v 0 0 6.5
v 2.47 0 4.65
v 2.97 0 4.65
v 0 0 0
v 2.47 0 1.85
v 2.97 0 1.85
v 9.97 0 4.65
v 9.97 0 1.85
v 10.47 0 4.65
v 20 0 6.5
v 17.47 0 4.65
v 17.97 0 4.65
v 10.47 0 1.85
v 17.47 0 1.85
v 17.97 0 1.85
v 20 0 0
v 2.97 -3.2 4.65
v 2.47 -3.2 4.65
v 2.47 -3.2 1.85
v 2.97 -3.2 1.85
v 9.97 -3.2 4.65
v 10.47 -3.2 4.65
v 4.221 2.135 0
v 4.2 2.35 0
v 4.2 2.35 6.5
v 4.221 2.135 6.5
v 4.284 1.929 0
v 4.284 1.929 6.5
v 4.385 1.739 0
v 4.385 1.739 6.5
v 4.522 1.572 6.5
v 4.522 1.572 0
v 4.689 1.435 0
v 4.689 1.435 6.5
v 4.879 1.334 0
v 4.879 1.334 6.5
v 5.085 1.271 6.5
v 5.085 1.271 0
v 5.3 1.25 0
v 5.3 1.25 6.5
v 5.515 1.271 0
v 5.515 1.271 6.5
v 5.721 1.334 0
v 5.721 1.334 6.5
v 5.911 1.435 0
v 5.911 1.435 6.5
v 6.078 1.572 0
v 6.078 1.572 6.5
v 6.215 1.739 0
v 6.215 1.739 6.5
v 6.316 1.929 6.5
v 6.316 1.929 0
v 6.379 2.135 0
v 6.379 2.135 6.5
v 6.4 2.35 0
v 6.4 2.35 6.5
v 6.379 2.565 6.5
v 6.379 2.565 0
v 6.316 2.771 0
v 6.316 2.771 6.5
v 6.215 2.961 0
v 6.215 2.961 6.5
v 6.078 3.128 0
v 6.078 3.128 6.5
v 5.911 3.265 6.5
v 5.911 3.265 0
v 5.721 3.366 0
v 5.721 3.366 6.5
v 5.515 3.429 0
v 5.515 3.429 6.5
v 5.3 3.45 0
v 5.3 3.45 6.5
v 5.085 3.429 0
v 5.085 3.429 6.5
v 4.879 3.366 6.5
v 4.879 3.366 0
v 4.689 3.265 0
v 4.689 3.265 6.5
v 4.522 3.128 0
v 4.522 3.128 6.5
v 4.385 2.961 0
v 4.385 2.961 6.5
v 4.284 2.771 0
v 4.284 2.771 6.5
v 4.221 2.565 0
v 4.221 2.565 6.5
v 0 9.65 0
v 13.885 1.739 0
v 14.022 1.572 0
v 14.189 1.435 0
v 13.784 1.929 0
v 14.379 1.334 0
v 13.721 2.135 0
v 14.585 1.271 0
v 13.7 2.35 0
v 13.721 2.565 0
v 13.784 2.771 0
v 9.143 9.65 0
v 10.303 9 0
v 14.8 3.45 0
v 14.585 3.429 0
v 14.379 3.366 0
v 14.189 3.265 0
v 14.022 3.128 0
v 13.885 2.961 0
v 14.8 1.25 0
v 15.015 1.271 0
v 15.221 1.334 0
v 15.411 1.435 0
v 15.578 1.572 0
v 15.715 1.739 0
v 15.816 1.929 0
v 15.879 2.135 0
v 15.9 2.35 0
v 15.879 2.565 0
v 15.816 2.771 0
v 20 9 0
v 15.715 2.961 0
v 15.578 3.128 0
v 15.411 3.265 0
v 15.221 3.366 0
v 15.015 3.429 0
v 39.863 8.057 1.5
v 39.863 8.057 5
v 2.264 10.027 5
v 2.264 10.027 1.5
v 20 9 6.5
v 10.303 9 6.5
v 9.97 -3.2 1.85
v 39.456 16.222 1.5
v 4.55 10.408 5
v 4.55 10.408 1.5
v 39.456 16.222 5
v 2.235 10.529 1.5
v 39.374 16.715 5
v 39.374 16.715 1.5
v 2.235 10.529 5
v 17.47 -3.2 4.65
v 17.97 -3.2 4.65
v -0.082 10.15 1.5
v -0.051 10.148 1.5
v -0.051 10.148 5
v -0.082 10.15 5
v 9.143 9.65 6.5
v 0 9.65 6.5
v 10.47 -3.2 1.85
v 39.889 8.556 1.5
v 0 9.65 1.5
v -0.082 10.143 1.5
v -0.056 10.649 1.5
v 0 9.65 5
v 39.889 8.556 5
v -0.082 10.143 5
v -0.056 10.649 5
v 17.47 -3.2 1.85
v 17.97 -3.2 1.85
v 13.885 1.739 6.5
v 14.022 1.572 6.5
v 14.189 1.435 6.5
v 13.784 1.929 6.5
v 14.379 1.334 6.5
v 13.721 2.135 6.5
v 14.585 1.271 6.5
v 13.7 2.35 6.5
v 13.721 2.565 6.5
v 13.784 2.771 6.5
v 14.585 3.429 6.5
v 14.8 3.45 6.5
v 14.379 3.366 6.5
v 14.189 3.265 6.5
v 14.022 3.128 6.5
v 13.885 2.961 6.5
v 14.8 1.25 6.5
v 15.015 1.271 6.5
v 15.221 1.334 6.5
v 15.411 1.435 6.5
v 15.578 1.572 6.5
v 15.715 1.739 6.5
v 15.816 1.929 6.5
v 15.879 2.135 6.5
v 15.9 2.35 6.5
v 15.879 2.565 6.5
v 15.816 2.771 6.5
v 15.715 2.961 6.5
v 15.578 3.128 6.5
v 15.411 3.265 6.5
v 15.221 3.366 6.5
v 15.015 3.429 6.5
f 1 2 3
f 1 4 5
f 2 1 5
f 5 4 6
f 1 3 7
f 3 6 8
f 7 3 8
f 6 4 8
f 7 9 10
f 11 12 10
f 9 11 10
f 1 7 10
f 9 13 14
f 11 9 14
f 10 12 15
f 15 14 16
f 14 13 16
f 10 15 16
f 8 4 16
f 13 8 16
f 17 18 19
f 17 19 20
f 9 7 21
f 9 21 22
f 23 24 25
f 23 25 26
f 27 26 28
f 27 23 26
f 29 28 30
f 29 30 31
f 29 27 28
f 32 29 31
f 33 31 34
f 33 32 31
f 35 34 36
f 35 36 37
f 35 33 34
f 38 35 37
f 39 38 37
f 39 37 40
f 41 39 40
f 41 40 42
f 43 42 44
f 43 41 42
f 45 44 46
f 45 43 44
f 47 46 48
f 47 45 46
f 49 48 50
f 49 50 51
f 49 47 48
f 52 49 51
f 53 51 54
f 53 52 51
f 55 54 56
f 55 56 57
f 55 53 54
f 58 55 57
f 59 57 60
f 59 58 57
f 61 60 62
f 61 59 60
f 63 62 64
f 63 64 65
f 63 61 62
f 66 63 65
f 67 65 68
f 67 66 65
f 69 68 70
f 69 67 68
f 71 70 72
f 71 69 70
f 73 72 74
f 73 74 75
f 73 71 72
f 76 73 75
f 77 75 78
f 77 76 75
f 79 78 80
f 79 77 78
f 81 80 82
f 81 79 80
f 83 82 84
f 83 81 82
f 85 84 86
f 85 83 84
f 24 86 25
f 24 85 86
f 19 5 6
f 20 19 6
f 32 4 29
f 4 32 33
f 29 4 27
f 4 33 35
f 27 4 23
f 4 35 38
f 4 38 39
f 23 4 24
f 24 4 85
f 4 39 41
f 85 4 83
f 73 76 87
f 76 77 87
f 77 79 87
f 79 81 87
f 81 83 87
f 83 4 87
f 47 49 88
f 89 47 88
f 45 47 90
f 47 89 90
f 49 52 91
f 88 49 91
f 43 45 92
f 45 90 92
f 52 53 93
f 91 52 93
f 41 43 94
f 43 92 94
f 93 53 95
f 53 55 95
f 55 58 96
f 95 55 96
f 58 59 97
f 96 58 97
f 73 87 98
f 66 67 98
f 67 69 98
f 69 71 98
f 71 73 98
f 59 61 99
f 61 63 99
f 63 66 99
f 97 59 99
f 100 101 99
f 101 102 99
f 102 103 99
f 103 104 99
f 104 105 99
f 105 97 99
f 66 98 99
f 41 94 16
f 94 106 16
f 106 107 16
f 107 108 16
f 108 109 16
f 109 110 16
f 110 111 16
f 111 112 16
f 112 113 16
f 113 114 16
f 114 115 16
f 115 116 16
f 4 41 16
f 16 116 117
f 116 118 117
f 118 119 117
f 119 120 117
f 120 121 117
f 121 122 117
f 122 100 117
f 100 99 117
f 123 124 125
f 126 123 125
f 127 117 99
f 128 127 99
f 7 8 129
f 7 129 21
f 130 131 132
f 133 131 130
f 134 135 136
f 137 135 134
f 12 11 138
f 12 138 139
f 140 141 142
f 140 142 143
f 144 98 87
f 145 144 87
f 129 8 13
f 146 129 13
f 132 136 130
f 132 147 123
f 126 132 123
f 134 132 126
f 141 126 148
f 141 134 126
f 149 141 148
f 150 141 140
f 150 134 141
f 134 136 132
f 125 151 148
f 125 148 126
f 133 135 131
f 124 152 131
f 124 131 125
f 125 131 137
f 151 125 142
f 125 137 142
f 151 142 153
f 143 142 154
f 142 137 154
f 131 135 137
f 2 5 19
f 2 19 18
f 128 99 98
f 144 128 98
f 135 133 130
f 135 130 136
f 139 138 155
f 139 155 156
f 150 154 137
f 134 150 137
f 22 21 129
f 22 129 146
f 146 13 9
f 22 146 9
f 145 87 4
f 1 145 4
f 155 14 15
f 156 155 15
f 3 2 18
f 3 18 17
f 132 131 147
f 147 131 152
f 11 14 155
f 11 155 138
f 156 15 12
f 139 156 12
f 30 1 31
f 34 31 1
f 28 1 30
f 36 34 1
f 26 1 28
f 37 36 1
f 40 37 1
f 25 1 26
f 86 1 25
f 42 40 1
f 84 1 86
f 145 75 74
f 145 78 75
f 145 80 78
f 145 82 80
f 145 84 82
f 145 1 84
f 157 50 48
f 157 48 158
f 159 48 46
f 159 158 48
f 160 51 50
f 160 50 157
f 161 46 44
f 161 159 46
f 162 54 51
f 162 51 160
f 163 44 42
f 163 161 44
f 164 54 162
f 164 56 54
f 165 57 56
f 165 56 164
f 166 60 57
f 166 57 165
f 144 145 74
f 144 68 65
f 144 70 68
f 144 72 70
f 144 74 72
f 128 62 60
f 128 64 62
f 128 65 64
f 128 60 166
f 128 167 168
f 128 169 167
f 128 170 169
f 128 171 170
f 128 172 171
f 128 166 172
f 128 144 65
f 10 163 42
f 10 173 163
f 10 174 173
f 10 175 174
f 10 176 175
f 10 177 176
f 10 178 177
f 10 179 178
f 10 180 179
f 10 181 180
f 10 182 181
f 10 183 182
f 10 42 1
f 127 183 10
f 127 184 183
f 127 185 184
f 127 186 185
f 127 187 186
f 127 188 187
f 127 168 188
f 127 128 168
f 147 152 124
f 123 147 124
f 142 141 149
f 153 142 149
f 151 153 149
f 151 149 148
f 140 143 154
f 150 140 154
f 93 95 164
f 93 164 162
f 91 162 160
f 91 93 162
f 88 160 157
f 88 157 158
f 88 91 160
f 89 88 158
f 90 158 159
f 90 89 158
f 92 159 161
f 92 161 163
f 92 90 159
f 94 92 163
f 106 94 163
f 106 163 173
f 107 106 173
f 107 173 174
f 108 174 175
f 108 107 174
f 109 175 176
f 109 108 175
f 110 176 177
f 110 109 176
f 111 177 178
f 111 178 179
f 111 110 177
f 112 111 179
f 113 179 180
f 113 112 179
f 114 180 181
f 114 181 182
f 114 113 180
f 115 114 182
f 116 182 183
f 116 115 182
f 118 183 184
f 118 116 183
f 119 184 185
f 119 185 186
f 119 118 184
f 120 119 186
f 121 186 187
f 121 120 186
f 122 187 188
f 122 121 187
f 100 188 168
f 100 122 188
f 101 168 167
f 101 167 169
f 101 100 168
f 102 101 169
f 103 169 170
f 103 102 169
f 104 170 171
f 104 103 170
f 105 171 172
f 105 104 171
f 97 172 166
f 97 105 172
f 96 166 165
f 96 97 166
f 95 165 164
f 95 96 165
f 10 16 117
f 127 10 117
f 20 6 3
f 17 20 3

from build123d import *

# Parameters (mm, degrees)
ESQUISSE1_R      = 1.1
EXTRUSION1_DEPTH = 6.5
EXTRUSION2_START = -1.5
EXTRUSION2_DEPTH = 3.5
EXTRUSION3_START = -1.5
EXTRUSION3_DEPTH = 3.5
ESQUISSE4_W      = 0.5
ESQUISSE4_H      = 2.8
EXTRUSION4_DEPTH = 3.2


with BuildPart() as part:
    # Esquisse1 → Extrusion1 (new body)
    with BuildSketch(Plane.XY):
        Polygon((0, 0), (20, 0), (20, 9), (10.302547929, 9), (9.142677069, 9.65), (0, 9.65), align=None)
        with Locations(Location((14.8, 2.35, 0), (0, 0, 180))):
            Circle(ESQUISSE1_R, mode=Mode.SUBTRACT)
        with Locations(Location((5.3, 2.35, 0), (0, 0, 180))):
            Circle(ESQUISSE1_R, mode=Mode.SUBTRACT)
    extrude(amount=EXTRUSION1_DEPTH)

    # Esquisse4 → Extrusion4 (add)
    with BuildSketch(Plane.XZ):
        with Locations((2.72, 3.25)):
            Rectangle(ESQUISSE4_W, ESQUISSE4_H)
        with Locations((10.22, 3.25)):
            Rectangle(ESQUISSE4_W, ESQUISSE4_H)
        with Locations((17.72, 3.25)):
            Rectangle(ESQUISSE4_W, ESQUISSE4_H)
    extrude(amount=EXTRUSION4_DEPTH)


with BuildPart() as body_2:
    # Esquisse2 → Extrusion2 (new body)
    with BuildSketch(Plane.XY.offset(6.5).offset(EXTRUSION2_START)):
        Polygon((0, 9.65), (39.456397781, 16.22211337), (39.374246364, 16.715318343), (-0.082151417, 10.143204972), align=None)
    extrude(amount=-EXTRUSION2_DEPTH)

    # Esquisse3 → Extrusion3 (add)
    with BuildSketch(Plane.XY.offset(6.5).offset(EXTRUSION3_START)):
        Polygon((-0.055983439, 10.649314767), (39.889197951, 8.555876518), (39.863029973, 8.05656175), (-0.082151417, 10.15), align=None)
    extrude(amount=-EXTRUSION3_DEPTH)


solid = Compound([part.part, body_2.part])
